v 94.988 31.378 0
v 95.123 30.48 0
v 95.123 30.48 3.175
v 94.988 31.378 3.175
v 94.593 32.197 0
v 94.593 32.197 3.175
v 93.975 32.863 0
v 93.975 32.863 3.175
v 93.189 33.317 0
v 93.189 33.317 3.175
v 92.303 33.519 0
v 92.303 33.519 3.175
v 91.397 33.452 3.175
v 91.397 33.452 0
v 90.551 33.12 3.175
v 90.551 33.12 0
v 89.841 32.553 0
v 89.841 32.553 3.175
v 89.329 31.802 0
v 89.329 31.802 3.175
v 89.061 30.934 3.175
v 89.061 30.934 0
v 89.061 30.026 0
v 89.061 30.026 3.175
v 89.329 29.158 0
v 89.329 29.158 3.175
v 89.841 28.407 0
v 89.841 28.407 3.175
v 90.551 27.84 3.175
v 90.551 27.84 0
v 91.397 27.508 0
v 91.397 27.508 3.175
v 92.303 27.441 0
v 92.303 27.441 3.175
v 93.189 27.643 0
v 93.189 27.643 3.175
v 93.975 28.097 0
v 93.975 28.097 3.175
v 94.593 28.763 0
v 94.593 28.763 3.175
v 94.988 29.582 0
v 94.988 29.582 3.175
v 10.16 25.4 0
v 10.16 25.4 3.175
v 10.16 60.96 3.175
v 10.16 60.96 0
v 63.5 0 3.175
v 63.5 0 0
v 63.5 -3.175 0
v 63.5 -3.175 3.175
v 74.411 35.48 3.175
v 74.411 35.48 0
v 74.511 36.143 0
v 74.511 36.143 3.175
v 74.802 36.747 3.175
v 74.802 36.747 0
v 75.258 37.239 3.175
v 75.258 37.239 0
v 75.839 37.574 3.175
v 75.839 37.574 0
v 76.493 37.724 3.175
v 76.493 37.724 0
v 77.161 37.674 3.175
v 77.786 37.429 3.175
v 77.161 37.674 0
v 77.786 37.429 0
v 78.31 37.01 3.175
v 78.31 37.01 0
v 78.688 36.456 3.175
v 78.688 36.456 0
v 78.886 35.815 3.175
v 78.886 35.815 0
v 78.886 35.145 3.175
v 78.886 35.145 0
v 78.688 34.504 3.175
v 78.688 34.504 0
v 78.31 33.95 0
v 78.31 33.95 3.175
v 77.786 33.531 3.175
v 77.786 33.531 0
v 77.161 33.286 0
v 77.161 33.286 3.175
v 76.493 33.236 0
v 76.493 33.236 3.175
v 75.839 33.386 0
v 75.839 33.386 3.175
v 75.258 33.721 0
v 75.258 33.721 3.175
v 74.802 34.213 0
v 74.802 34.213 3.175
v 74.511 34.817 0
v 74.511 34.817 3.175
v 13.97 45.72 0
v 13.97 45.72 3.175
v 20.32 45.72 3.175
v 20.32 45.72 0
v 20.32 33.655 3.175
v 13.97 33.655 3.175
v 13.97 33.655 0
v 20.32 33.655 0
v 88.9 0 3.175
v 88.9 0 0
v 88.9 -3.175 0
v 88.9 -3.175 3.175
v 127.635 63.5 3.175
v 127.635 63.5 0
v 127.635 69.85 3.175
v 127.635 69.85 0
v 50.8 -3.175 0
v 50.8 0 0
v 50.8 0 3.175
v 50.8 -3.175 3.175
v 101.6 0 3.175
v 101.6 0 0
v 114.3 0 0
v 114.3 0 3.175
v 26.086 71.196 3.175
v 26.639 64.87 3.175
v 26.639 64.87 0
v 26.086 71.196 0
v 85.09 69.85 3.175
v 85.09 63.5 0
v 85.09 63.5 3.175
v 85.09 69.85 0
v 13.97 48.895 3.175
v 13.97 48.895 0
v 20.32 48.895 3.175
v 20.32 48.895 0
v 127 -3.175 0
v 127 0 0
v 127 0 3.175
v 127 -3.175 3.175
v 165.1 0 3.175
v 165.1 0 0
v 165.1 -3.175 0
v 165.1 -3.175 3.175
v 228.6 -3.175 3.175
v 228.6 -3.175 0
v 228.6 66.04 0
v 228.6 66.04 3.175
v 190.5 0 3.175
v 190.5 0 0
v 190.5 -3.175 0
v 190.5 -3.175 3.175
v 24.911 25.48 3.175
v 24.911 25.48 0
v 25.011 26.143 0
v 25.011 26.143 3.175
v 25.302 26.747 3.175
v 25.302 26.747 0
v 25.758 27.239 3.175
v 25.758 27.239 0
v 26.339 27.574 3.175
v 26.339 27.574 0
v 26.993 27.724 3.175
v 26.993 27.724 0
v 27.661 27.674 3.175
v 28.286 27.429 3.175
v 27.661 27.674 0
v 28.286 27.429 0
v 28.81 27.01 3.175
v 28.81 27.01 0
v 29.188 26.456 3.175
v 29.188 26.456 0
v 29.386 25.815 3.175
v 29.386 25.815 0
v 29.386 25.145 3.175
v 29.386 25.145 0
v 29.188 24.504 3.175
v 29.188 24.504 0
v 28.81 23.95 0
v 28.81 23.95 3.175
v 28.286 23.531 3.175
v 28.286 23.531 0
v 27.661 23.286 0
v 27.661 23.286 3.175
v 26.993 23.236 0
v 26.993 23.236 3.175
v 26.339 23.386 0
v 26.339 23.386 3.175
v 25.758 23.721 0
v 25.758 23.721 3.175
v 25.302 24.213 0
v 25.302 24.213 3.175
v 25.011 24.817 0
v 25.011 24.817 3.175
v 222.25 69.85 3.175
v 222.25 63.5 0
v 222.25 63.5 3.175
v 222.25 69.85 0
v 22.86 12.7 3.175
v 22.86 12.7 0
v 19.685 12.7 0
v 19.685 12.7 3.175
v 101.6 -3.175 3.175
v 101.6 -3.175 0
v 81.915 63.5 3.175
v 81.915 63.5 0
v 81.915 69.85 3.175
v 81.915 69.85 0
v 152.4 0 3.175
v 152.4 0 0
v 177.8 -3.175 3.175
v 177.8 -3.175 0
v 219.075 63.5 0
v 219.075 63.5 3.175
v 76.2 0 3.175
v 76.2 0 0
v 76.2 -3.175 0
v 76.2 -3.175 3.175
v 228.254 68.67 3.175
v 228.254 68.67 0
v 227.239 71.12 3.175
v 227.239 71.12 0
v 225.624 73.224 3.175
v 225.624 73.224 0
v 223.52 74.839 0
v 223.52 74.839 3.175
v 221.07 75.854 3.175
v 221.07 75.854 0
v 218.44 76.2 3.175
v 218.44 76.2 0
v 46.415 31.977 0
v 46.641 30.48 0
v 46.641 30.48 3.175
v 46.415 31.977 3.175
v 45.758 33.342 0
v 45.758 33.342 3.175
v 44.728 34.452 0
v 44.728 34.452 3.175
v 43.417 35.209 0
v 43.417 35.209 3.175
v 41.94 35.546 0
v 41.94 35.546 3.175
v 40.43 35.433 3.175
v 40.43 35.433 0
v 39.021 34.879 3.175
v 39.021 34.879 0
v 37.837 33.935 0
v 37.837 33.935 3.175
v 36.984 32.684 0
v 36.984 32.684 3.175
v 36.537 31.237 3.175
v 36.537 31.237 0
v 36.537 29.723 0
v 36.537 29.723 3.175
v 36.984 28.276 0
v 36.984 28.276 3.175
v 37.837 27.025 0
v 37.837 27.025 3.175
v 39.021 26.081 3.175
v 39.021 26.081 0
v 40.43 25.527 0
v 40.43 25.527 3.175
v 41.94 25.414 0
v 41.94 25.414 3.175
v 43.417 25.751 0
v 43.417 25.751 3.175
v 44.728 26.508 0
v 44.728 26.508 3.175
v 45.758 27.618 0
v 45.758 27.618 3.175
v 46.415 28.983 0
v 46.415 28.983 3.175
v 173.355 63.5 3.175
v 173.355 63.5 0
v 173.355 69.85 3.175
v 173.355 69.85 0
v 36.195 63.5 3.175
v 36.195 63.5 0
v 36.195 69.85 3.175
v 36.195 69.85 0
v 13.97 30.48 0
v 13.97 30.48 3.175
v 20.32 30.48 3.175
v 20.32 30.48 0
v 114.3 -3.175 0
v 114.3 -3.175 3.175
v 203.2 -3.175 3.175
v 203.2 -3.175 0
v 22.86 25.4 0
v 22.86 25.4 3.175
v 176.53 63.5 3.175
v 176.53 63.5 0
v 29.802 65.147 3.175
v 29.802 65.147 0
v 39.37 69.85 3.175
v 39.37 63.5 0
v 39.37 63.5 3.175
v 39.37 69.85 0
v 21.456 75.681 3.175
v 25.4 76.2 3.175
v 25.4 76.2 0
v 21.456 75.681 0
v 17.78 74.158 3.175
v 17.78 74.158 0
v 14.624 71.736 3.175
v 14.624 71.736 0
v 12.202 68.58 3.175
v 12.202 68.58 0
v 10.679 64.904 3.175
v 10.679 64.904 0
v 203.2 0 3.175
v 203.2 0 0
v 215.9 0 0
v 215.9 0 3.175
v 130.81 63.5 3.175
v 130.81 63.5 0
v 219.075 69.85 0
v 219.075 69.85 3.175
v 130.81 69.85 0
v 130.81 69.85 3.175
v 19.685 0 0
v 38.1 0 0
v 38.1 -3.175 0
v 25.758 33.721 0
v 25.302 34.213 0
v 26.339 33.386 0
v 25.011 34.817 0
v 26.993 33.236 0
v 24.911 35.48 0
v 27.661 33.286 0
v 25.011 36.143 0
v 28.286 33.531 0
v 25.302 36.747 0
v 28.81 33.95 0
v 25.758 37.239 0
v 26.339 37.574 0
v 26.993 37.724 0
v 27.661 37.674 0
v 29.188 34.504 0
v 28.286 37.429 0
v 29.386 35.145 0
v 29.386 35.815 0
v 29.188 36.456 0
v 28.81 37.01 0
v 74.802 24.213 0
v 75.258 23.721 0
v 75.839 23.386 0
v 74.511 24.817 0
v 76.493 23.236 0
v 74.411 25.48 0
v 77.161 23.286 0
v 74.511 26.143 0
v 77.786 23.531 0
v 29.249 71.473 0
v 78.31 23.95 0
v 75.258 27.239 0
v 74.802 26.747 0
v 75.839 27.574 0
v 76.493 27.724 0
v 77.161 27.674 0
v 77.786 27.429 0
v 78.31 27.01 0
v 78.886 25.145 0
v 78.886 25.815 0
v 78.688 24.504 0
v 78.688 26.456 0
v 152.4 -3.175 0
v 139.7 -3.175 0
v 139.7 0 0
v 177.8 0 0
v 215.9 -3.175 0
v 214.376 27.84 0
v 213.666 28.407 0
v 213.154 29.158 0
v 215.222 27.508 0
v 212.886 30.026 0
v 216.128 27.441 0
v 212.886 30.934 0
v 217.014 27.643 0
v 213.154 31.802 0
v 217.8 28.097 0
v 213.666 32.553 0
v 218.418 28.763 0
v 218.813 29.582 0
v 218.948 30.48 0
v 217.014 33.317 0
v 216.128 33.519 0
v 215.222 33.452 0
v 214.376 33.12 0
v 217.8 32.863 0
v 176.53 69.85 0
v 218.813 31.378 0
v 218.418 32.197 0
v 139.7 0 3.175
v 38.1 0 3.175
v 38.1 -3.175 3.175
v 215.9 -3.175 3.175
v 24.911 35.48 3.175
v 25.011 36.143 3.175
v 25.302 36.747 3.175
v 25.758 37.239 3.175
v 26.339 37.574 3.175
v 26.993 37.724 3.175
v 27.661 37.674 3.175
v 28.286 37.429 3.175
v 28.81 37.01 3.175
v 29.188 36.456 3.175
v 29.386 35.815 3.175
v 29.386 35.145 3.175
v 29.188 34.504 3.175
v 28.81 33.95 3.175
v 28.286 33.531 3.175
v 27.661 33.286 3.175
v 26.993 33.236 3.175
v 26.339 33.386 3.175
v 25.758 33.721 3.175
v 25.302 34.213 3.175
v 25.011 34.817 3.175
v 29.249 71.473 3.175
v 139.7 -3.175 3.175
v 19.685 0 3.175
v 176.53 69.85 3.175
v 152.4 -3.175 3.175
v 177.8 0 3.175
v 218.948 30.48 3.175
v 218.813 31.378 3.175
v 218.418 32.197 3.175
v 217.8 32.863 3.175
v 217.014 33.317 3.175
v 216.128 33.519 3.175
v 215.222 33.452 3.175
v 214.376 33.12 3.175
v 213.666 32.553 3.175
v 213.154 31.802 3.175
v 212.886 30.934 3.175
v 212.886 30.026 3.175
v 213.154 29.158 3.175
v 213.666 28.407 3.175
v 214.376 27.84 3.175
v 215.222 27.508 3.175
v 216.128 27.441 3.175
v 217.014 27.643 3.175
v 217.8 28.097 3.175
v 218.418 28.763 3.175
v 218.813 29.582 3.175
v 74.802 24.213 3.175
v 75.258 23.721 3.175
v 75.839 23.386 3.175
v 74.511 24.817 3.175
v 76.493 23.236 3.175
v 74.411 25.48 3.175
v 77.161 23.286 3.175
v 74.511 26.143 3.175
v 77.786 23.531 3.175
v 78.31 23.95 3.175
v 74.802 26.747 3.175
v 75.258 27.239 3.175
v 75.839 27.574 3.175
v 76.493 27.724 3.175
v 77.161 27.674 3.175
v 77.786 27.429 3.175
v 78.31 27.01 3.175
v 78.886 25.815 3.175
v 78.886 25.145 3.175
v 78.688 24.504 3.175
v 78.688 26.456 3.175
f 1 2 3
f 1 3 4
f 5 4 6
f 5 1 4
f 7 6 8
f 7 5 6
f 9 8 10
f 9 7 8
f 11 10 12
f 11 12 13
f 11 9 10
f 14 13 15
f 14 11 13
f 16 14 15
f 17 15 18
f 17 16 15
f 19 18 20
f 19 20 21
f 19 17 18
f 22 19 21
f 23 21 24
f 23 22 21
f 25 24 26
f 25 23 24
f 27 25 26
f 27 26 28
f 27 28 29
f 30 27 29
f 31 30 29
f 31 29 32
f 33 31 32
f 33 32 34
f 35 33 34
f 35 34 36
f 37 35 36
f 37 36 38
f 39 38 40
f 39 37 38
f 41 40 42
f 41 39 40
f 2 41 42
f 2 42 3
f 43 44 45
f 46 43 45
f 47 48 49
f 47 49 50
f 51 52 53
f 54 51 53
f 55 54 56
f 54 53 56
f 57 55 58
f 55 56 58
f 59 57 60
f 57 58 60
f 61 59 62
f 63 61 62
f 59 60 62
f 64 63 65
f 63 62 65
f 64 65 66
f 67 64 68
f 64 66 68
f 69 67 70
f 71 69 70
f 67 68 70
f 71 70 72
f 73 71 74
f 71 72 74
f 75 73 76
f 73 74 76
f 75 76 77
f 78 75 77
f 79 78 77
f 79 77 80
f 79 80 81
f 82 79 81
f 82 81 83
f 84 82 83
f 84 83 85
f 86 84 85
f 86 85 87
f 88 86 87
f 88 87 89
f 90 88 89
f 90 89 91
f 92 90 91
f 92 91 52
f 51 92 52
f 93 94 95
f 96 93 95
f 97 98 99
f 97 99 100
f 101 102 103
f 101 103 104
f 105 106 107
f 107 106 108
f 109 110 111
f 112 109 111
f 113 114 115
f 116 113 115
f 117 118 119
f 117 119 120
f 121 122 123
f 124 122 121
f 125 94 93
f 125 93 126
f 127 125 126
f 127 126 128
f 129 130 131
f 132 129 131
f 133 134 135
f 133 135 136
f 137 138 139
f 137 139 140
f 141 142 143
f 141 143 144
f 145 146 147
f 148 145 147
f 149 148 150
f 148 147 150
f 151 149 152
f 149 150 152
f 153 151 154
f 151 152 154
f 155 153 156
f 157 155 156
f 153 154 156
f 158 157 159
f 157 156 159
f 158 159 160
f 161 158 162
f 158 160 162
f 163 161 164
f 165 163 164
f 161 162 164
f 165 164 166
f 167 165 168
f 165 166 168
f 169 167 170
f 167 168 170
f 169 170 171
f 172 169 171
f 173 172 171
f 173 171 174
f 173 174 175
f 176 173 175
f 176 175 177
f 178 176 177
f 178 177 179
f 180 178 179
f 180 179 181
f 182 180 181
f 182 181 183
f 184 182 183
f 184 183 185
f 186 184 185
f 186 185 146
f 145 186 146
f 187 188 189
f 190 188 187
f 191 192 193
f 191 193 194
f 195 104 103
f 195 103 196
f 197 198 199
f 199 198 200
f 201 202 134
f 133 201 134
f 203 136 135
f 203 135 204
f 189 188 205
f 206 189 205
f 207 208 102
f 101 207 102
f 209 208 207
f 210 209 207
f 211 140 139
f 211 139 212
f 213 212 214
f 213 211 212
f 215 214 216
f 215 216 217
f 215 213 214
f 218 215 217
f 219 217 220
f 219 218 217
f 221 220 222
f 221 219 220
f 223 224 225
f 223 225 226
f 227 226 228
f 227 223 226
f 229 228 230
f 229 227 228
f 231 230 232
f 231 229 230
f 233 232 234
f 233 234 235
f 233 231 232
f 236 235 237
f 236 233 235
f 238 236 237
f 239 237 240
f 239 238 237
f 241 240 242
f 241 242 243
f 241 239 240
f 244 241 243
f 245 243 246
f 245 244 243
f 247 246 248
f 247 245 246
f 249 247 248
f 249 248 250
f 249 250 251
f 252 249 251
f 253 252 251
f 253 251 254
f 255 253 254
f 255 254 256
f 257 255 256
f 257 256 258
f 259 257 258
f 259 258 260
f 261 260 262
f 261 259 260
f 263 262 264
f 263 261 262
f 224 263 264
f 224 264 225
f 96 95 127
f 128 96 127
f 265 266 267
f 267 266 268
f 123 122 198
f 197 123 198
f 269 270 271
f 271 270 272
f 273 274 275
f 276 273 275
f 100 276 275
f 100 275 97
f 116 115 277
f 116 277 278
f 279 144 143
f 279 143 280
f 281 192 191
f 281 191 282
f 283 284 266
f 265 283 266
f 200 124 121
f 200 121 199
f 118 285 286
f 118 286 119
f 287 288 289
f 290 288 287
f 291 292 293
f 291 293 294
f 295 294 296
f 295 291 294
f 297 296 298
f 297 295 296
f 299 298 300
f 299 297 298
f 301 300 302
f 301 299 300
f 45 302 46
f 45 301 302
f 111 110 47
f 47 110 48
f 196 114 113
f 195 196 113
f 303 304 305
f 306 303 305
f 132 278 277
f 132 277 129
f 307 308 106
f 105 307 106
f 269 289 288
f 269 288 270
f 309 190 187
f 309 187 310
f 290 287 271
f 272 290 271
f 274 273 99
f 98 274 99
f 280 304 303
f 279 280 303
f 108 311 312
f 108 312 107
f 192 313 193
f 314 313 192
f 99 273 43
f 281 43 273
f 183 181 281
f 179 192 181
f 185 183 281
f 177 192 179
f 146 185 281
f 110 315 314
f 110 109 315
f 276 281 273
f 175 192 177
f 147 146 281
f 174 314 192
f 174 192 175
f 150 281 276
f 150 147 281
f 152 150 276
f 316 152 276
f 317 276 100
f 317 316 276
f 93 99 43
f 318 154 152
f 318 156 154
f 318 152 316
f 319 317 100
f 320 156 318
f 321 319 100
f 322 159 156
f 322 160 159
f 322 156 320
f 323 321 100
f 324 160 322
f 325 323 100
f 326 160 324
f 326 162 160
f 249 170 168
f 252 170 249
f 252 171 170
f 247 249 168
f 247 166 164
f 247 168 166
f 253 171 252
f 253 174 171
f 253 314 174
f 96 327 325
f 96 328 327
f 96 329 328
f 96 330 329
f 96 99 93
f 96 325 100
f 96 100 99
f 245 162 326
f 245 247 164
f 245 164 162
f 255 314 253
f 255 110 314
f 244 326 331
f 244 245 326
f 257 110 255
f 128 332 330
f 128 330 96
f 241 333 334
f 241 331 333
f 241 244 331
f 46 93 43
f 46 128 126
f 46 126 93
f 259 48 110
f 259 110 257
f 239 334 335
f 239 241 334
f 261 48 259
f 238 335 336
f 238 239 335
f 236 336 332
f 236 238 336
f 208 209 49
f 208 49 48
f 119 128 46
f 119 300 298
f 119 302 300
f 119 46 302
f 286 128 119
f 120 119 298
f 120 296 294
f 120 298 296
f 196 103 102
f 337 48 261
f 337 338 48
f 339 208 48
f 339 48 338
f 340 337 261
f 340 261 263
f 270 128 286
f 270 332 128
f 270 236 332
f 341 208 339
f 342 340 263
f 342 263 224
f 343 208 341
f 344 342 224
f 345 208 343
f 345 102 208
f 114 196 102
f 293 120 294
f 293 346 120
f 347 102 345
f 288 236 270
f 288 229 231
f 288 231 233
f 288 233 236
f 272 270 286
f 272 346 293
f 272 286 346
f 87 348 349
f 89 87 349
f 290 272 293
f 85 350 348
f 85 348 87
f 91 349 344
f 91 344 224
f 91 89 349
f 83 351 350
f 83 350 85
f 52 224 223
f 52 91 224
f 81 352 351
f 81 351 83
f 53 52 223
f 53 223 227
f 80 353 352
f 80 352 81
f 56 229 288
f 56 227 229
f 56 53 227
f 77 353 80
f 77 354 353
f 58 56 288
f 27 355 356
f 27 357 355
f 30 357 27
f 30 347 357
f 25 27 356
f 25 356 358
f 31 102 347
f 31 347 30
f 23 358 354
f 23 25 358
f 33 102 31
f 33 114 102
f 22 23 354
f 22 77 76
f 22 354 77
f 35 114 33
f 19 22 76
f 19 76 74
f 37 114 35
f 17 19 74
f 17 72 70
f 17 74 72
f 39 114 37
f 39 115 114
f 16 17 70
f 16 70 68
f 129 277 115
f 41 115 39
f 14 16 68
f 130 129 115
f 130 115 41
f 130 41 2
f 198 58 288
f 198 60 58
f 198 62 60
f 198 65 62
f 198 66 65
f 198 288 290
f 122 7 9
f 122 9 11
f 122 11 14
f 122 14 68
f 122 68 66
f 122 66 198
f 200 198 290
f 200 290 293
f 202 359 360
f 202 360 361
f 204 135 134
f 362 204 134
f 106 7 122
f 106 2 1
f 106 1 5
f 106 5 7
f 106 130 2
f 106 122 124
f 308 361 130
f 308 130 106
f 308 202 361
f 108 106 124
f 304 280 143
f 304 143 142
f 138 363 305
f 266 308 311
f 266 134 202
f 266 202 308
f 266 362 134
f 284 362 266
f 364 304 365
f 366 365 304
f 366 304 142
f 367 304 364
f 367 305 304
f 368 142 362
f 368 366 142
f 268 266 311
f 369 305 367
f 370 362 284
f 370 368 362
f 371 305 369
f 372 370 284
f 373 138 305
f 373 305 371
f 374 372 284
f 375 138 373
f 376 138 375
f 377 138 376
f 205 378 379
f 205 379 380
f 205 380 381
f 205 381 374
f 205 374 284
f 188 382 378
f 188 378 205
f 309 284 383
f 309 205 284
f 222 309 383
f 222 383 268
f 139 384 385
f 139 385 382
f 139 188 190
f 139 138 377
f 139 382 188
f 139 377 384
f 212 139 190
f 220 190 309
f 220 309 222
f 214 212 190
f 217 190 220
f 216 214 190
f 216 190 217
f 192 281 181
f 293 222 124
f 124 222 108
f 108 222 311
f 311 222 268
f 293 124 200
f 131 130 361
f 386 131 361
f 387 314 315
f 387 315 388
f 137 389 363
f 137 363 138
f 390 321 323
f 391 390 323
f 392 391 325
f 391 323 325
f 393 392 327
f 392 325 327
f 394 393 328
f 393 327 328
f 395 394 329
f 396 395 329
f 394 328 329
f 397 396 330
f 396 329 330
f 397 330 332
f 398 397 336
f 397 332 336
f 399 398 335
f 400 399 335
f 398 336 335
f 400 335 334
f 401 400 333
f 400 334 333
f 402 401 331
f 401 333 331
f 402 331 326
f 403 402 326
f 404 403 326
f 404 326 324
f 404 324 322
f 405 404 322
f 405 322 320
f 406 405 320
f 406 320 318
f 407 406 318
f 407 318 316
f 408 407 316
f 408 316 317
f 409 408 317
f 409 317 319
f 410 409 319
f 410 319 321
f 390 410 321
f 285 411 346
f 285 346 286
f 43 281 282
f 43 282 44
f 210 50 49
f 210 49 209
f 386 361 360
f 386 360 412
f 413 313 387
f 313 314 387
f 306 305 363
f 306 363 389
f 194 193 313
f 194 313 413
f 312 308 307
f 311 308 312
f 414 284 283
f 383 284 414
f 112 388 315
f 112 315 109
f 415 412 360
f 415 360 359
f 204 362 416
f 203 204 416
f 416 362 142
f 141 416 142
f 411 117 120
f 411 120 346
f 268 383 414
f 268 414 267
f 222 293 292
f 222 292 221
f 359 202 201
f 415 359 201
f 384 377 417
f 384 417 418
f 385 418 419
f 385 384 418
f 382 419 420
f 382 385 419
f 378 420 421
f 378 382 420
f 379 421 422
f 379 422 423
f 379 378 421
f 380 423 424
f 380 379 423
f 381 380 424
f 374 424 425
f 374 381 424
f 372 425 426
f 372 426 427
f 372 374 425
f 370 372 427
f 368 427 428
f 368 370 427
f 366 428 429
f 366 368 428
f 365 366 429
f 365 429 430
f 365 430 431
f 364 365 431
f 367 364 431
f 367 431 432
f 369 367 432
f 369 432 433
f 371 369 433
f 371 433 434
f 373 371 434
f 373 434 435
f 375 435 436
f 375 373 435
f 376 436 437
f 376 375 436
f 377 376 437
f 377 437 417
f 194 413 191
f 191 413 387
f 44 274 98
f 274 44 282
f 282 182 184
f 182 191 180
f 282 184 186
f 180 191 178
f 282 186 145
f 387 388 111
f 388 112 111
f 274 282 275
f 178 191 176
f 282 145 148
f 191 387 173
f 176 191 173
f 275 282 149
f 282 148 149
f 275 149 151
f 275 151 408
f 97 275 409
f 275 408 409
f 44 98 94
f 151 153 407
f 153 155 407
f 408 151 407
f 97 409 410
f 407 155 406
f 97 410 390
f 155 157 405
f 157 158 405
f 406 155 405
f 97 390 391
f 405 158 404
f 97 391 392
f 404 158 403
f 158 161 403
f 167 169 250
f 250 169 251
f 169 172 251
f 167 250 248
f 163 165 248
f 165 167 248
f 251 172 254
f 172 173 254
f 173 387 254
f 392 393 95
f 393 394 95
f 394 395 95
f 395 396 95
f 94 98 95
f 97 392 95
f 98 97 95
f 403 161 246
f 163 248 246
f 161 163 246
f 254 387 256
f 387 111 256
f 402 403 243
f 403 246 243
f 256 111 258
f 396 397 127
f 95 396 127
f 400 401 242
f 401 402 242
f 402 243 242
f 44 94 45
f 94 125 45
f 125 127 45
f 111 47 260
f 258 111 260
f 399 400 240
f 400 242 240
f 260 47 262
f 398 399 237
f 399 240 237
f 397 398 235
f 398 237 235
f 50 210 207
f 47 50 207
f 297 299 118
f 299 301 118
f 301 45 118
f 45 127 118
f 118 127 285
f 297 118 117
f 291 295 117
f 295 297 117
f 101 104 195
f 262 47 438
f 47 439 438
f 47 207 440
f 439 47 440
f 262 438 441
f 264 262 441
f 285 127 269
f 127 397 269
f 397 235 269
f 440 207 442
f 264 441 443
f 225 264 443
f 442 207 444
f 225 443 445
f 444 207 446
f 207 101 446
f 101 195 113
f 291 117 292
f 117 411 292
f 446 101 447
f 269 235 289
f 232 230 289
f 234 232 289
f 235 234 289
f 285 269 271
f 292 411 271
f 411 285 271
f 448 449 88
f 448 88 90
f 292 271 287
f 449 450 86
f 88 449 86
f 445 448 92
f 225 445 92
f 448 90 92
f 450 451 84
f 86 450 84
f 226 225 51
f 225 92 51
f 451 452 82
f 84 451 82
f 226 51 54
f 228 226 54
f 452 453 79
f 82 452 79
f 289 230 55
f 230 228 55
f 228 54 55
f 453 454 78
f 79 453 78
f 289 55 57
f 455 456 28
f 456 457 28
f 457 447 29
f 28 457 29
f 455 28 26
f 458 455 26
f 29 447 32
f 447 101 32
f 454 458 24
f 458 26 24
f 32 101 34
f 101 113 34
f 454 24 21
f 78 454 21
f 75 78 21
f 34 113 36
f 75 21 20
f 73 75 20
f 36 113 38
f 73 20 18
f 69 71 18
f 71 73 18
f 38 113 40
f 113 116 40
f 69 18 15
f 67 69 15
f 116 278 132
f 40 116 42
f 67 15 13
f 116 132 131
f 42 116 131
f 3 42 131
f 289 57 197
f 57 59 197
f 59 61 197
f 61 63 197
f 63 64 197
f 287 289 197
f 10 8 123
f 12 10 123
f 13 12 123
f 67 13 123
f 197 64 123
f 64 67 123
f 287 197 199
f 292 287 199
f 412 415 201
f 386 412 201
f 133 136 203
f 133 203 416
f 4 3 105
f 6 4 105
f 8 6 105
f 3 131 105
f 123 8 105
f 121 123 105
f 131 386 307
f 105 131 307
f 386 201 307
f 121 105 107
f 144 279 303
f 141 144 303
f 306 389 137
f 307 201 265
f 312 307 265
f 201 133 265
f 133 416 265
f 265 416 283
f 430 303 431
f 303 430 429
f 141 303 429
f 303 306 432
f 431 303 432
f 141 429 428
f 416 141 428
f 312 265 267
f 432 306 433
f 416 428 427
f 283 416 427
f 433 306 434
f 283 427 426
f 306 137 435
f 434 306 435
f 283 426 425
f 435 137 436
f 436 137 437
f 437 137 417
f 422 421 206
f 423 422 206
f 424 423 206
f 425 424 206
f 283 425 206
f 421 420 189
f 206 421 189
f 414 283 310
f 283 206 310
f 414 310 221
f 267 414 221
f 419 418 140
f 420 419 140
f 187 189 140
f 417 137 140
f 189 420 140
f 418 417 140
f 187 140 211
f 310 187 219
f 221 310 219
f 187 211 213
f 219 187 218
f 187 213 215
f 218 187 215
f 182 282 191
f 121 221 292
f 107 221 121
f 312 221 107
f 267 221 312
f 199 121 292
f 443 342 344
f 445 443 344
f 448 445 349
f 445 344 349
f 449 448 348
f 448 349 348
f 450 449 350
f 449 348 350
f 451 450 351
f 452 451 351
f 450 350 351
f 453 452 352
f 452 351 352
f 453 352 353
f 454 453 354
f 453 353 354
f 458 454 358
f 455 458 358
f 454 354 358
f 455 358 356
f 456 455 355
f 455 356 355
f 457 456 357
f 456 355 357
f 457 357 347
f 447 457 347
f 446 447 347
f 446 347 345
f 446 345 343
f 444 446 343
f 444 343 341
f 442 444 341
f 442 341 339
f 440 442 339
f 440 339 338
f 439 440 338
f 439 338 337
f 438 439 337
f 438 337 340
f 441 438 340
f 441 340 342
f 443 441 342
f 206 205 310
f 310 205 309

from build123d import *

# Parameters (mm, degrees)
SKETCH1_W           = 228.6
SKETCH1_H           = 76.2
SKETCH1_R           = 3.048
SKETCH1_R_2         = 5.08
BOSS_EXTRUDE1_DEPTH = 3.175
SKETCH2_W           = 12.7
SKETCH2_H           = 3.175
BOSS_EXTRUDE2_DEPTH = 3.175
SKETCH3_W           = 22.86
SKETCH3_H           = 25.4
CUT_EXTRUDE1_DEPTH  = 4.175
SKETCH4_W           = 3.175
SKETCH4_H           = 12.7
BOSS_EXTRUDE3_DEPTH = 3.175
SKETCH6_R           = 2.25
CUT_EXTRUDE2_DEPTH  = 4.175
SKETCH8_W           = 10.16
SKETCH8_H           = 50.8
CUT_EXTRUDE3_DEPTH  = 4.175
SKETCH12_W          = 3.175
SKETCH12_H          = 6.35
CUT_EXTRUDE5_DEPTH  = 3.175
CUT_EXTRUDE6_DEPTH  = 4.175
SKETCH14_W          = 6.35
SKETCH14_H          = 3.175
CUT_EXTRUDE7_DEPTH  = 4.175
CUT_EXTRUDE8_DEPTH  = 4.175
CUT_EXTRUDE9_DEPTH  = 4.175


with BuildPart() as part:
    # Sketch1 → Boss-Extrude1 (new body)
    with BuildSketch(Plane.XY):
        with Locations((114.3, 38.1)):
            Rectangle(SKETCH1_W, SKETCH1_H)
        with Locations((215.9, 30.48)):
            Circle(SKETCH1_R, mode=Mode.SUBTRACT)
        with Locations((92.075, 30.48)):
            Circle(SKETCH1_R, mode=Mode.SUBTRACT)
        with Locations((41.56075, 30.48)):
            Circle(SKETCH1_R_2, mode=Mode.SUBTRACT)
    extrude(amount=BOSS_EXTRUDE1_DEPTH)

    # Sketch2 → Boss-Extrude2 (add)
    with BuildSketch(Plane.XZ):
        with Locations((222.25, 1.5875)):
            Rectangle(SKETCH2_W, SKETCH2_H)
        with Locations((196.85, 1.5875)):
            Rectangle(SKETCH2_W, SKETCH2_H)
        with Locations((171.45, 1.5875)):
            Rectangle(SKETCH2_W, SKETCH2_H)
        with Locations((146.05, 1.5875)):
            Rectangle(SKETCH2_W, SKETCH2_H)
        with Locations((120.65, 1.5875)):
            Rectangle(SKETCH2_W, SKETCH2_H)
        with Locations((95.25, 1.5875)):
            Rectangle(SKETCH2_W, SKETCH2_H)
        with Locations((69.85, 1.5875)):
            Rectangle(SKETCH2_W, SKETCH2_H)
        with Locations((44.45, 1.5875)):
            Rectangle(SKETCH2_W, SKETCH2_H)
    extrude(amount=BOSS_EXTRUDE2_DEPTH)

    # Sketch3 → Cut-Extrude1 (cut, through all)
    with BuildSketch(Plane(origin=(0, 0, 0), x_dir=(-1, 0, 0), z_dir=(0, 0, -1))):
        with Locations((-11.43, 12.7)):
            Rectangle(SKETCH3_W, SKETCH3_H)
    extrude(amount=-CUT_EXTRUDE1_DEPTH, mode=Mode.SUBTRACT)

    # Sketch4 → Boss-Extrude3 (add)
    with BuildSketch(Plane.ZY.offset(-22.86)):
        with Locations((1.5875, 6.35)):
            Rectangle(SKETCH4_W, SKETCH4_H)
    extrude(amount=BOSS_EXTRUDE3_DEPTH)

    # Sketch6 → Cut-Extrude2 (cut, through all)
    with BuildSketch(Plane(origin=(0, 0, 0), x_dir=(-1, 0, 0), z_dir=(0, 0, -1))):
        with Locations((-27.16075, 35.48)):
            Circle(SKETCH6_R)
        with Locations((-27.16075, 25.48)):
            Circle(SKETCH6_R)
        with Locations((-76.66075, 35.48)):
            Circle(SKETCH6_R)
        with Locations((-76.66075, 25.48)):
            Circle(SKETCH6_R)
    extrude(amount=-CUT_EXTRUDE2_DEPTH, mode=Mode.SUBTRACT)

    # Sketch8 → Cut-Extrude3 (cut, through all)
    with BuildSketch(Plane.XY.offset(3.175)):
        with Locations((5.08, 50.8)):
            Rectangle(SKETCH8_W, SKETCH8_H)
    extrude(amount=-CUT_EXTRUDE3_DEPTH, mode=Mode.SUBTRACT)

    # Sketch12 → Cut-Extrude5 (cut)
    with BuildSketch(Plane(origin=(0, 0, 0), x_dir=(-1, 0, 0), z_dir=(0, 0, -1))):
        with Locations((-220.6625, 66.675)):
            Rectangle(SKETCH12_W, SKETCH12_H)
        with Locations((-174.9425, 66.675)):
            Rectangle(SKETCH12_W, SKETCH12_H)
        with Locations((-129.2225, 66.675)):
            Rectangle(SKETCH12_W, SKETCH12_H)
        with Locations((-83.5025, 66.675)):
            Rectangle(SKETCH12_W, SKETCH12_H)
        with Locations((-37.7825, 66.675)):
            Rectangle(SKETCH12_W, SKETCH12_H)
    extrude(amount=-CUT_EXTRUDE5_DEPTH, mode=Mode.SUBTRACT)

    # Sketch13 → Cut-Extrude6 (cut, through all)
    with BuildSketch(Plane.XY.offset(3.175)):
        with BuildLine():
            Line((10.16, 60.96), (10.16, 76.2))
            Line((10.16, 76.2), (25.4, 76.2))
            ThreePointArc((25.4, 76.2), (14.623692655, 71.736307345), (10.16, 60.96))
        make_face()
    extrude(amount=-CUT_EXTRUDE6_DEPTH, mode=Mode.SUBTRACT)

    # Sketch14 → Cut-Extrude7 (cut, through all)
    with BuildSketch(Plane.XY.offset(3.175)):
        with Locations((17.145, 32.0675)):
            Rectangle(SKETCH14_W, SKETCH14_H)
        with Locations((17.145, 47.3075)):
            Rectangle(SKETCH14_W, SKETCH14_H)
    extrude(amount=-CUT_EXTRUDE7_DEPTH, mode=Mode.SUBTRACT)

    # Sketch15 → Cut-Extrude8 (cut, through all)
    with BuildSketch(Plane.XY.offset(3.175)):
        Polygon((26.639339978, 64.870175511), (26.085901012, 71.196011844), (29.248819178, 71.472731328), (29.802258145, 65.146894995), align=None)
    extrude(amount=-CUT_EXTRUDE8_DEPTH, mode=Mode.SUBTRACT)

    # Sketch16 → Cut-Extrude9 (cut, through all)
    with BuildSketch(Plane.XY.offset(3.175)):
        with BuildLine():
            Line((218.44, 76.2), (228.6, 76.2))
            Line((228.6, 76.2), (228.6, 66.04))
            ThreePointArc((228.6, 66.04), (225.624204897, 73.224204897), (218.44, 76.2))
        make_face()
    extrude(amount=-CUT_EXTRUDE9_DEPTH, mode=Mode.SUBTRACT)


solid = part.part
